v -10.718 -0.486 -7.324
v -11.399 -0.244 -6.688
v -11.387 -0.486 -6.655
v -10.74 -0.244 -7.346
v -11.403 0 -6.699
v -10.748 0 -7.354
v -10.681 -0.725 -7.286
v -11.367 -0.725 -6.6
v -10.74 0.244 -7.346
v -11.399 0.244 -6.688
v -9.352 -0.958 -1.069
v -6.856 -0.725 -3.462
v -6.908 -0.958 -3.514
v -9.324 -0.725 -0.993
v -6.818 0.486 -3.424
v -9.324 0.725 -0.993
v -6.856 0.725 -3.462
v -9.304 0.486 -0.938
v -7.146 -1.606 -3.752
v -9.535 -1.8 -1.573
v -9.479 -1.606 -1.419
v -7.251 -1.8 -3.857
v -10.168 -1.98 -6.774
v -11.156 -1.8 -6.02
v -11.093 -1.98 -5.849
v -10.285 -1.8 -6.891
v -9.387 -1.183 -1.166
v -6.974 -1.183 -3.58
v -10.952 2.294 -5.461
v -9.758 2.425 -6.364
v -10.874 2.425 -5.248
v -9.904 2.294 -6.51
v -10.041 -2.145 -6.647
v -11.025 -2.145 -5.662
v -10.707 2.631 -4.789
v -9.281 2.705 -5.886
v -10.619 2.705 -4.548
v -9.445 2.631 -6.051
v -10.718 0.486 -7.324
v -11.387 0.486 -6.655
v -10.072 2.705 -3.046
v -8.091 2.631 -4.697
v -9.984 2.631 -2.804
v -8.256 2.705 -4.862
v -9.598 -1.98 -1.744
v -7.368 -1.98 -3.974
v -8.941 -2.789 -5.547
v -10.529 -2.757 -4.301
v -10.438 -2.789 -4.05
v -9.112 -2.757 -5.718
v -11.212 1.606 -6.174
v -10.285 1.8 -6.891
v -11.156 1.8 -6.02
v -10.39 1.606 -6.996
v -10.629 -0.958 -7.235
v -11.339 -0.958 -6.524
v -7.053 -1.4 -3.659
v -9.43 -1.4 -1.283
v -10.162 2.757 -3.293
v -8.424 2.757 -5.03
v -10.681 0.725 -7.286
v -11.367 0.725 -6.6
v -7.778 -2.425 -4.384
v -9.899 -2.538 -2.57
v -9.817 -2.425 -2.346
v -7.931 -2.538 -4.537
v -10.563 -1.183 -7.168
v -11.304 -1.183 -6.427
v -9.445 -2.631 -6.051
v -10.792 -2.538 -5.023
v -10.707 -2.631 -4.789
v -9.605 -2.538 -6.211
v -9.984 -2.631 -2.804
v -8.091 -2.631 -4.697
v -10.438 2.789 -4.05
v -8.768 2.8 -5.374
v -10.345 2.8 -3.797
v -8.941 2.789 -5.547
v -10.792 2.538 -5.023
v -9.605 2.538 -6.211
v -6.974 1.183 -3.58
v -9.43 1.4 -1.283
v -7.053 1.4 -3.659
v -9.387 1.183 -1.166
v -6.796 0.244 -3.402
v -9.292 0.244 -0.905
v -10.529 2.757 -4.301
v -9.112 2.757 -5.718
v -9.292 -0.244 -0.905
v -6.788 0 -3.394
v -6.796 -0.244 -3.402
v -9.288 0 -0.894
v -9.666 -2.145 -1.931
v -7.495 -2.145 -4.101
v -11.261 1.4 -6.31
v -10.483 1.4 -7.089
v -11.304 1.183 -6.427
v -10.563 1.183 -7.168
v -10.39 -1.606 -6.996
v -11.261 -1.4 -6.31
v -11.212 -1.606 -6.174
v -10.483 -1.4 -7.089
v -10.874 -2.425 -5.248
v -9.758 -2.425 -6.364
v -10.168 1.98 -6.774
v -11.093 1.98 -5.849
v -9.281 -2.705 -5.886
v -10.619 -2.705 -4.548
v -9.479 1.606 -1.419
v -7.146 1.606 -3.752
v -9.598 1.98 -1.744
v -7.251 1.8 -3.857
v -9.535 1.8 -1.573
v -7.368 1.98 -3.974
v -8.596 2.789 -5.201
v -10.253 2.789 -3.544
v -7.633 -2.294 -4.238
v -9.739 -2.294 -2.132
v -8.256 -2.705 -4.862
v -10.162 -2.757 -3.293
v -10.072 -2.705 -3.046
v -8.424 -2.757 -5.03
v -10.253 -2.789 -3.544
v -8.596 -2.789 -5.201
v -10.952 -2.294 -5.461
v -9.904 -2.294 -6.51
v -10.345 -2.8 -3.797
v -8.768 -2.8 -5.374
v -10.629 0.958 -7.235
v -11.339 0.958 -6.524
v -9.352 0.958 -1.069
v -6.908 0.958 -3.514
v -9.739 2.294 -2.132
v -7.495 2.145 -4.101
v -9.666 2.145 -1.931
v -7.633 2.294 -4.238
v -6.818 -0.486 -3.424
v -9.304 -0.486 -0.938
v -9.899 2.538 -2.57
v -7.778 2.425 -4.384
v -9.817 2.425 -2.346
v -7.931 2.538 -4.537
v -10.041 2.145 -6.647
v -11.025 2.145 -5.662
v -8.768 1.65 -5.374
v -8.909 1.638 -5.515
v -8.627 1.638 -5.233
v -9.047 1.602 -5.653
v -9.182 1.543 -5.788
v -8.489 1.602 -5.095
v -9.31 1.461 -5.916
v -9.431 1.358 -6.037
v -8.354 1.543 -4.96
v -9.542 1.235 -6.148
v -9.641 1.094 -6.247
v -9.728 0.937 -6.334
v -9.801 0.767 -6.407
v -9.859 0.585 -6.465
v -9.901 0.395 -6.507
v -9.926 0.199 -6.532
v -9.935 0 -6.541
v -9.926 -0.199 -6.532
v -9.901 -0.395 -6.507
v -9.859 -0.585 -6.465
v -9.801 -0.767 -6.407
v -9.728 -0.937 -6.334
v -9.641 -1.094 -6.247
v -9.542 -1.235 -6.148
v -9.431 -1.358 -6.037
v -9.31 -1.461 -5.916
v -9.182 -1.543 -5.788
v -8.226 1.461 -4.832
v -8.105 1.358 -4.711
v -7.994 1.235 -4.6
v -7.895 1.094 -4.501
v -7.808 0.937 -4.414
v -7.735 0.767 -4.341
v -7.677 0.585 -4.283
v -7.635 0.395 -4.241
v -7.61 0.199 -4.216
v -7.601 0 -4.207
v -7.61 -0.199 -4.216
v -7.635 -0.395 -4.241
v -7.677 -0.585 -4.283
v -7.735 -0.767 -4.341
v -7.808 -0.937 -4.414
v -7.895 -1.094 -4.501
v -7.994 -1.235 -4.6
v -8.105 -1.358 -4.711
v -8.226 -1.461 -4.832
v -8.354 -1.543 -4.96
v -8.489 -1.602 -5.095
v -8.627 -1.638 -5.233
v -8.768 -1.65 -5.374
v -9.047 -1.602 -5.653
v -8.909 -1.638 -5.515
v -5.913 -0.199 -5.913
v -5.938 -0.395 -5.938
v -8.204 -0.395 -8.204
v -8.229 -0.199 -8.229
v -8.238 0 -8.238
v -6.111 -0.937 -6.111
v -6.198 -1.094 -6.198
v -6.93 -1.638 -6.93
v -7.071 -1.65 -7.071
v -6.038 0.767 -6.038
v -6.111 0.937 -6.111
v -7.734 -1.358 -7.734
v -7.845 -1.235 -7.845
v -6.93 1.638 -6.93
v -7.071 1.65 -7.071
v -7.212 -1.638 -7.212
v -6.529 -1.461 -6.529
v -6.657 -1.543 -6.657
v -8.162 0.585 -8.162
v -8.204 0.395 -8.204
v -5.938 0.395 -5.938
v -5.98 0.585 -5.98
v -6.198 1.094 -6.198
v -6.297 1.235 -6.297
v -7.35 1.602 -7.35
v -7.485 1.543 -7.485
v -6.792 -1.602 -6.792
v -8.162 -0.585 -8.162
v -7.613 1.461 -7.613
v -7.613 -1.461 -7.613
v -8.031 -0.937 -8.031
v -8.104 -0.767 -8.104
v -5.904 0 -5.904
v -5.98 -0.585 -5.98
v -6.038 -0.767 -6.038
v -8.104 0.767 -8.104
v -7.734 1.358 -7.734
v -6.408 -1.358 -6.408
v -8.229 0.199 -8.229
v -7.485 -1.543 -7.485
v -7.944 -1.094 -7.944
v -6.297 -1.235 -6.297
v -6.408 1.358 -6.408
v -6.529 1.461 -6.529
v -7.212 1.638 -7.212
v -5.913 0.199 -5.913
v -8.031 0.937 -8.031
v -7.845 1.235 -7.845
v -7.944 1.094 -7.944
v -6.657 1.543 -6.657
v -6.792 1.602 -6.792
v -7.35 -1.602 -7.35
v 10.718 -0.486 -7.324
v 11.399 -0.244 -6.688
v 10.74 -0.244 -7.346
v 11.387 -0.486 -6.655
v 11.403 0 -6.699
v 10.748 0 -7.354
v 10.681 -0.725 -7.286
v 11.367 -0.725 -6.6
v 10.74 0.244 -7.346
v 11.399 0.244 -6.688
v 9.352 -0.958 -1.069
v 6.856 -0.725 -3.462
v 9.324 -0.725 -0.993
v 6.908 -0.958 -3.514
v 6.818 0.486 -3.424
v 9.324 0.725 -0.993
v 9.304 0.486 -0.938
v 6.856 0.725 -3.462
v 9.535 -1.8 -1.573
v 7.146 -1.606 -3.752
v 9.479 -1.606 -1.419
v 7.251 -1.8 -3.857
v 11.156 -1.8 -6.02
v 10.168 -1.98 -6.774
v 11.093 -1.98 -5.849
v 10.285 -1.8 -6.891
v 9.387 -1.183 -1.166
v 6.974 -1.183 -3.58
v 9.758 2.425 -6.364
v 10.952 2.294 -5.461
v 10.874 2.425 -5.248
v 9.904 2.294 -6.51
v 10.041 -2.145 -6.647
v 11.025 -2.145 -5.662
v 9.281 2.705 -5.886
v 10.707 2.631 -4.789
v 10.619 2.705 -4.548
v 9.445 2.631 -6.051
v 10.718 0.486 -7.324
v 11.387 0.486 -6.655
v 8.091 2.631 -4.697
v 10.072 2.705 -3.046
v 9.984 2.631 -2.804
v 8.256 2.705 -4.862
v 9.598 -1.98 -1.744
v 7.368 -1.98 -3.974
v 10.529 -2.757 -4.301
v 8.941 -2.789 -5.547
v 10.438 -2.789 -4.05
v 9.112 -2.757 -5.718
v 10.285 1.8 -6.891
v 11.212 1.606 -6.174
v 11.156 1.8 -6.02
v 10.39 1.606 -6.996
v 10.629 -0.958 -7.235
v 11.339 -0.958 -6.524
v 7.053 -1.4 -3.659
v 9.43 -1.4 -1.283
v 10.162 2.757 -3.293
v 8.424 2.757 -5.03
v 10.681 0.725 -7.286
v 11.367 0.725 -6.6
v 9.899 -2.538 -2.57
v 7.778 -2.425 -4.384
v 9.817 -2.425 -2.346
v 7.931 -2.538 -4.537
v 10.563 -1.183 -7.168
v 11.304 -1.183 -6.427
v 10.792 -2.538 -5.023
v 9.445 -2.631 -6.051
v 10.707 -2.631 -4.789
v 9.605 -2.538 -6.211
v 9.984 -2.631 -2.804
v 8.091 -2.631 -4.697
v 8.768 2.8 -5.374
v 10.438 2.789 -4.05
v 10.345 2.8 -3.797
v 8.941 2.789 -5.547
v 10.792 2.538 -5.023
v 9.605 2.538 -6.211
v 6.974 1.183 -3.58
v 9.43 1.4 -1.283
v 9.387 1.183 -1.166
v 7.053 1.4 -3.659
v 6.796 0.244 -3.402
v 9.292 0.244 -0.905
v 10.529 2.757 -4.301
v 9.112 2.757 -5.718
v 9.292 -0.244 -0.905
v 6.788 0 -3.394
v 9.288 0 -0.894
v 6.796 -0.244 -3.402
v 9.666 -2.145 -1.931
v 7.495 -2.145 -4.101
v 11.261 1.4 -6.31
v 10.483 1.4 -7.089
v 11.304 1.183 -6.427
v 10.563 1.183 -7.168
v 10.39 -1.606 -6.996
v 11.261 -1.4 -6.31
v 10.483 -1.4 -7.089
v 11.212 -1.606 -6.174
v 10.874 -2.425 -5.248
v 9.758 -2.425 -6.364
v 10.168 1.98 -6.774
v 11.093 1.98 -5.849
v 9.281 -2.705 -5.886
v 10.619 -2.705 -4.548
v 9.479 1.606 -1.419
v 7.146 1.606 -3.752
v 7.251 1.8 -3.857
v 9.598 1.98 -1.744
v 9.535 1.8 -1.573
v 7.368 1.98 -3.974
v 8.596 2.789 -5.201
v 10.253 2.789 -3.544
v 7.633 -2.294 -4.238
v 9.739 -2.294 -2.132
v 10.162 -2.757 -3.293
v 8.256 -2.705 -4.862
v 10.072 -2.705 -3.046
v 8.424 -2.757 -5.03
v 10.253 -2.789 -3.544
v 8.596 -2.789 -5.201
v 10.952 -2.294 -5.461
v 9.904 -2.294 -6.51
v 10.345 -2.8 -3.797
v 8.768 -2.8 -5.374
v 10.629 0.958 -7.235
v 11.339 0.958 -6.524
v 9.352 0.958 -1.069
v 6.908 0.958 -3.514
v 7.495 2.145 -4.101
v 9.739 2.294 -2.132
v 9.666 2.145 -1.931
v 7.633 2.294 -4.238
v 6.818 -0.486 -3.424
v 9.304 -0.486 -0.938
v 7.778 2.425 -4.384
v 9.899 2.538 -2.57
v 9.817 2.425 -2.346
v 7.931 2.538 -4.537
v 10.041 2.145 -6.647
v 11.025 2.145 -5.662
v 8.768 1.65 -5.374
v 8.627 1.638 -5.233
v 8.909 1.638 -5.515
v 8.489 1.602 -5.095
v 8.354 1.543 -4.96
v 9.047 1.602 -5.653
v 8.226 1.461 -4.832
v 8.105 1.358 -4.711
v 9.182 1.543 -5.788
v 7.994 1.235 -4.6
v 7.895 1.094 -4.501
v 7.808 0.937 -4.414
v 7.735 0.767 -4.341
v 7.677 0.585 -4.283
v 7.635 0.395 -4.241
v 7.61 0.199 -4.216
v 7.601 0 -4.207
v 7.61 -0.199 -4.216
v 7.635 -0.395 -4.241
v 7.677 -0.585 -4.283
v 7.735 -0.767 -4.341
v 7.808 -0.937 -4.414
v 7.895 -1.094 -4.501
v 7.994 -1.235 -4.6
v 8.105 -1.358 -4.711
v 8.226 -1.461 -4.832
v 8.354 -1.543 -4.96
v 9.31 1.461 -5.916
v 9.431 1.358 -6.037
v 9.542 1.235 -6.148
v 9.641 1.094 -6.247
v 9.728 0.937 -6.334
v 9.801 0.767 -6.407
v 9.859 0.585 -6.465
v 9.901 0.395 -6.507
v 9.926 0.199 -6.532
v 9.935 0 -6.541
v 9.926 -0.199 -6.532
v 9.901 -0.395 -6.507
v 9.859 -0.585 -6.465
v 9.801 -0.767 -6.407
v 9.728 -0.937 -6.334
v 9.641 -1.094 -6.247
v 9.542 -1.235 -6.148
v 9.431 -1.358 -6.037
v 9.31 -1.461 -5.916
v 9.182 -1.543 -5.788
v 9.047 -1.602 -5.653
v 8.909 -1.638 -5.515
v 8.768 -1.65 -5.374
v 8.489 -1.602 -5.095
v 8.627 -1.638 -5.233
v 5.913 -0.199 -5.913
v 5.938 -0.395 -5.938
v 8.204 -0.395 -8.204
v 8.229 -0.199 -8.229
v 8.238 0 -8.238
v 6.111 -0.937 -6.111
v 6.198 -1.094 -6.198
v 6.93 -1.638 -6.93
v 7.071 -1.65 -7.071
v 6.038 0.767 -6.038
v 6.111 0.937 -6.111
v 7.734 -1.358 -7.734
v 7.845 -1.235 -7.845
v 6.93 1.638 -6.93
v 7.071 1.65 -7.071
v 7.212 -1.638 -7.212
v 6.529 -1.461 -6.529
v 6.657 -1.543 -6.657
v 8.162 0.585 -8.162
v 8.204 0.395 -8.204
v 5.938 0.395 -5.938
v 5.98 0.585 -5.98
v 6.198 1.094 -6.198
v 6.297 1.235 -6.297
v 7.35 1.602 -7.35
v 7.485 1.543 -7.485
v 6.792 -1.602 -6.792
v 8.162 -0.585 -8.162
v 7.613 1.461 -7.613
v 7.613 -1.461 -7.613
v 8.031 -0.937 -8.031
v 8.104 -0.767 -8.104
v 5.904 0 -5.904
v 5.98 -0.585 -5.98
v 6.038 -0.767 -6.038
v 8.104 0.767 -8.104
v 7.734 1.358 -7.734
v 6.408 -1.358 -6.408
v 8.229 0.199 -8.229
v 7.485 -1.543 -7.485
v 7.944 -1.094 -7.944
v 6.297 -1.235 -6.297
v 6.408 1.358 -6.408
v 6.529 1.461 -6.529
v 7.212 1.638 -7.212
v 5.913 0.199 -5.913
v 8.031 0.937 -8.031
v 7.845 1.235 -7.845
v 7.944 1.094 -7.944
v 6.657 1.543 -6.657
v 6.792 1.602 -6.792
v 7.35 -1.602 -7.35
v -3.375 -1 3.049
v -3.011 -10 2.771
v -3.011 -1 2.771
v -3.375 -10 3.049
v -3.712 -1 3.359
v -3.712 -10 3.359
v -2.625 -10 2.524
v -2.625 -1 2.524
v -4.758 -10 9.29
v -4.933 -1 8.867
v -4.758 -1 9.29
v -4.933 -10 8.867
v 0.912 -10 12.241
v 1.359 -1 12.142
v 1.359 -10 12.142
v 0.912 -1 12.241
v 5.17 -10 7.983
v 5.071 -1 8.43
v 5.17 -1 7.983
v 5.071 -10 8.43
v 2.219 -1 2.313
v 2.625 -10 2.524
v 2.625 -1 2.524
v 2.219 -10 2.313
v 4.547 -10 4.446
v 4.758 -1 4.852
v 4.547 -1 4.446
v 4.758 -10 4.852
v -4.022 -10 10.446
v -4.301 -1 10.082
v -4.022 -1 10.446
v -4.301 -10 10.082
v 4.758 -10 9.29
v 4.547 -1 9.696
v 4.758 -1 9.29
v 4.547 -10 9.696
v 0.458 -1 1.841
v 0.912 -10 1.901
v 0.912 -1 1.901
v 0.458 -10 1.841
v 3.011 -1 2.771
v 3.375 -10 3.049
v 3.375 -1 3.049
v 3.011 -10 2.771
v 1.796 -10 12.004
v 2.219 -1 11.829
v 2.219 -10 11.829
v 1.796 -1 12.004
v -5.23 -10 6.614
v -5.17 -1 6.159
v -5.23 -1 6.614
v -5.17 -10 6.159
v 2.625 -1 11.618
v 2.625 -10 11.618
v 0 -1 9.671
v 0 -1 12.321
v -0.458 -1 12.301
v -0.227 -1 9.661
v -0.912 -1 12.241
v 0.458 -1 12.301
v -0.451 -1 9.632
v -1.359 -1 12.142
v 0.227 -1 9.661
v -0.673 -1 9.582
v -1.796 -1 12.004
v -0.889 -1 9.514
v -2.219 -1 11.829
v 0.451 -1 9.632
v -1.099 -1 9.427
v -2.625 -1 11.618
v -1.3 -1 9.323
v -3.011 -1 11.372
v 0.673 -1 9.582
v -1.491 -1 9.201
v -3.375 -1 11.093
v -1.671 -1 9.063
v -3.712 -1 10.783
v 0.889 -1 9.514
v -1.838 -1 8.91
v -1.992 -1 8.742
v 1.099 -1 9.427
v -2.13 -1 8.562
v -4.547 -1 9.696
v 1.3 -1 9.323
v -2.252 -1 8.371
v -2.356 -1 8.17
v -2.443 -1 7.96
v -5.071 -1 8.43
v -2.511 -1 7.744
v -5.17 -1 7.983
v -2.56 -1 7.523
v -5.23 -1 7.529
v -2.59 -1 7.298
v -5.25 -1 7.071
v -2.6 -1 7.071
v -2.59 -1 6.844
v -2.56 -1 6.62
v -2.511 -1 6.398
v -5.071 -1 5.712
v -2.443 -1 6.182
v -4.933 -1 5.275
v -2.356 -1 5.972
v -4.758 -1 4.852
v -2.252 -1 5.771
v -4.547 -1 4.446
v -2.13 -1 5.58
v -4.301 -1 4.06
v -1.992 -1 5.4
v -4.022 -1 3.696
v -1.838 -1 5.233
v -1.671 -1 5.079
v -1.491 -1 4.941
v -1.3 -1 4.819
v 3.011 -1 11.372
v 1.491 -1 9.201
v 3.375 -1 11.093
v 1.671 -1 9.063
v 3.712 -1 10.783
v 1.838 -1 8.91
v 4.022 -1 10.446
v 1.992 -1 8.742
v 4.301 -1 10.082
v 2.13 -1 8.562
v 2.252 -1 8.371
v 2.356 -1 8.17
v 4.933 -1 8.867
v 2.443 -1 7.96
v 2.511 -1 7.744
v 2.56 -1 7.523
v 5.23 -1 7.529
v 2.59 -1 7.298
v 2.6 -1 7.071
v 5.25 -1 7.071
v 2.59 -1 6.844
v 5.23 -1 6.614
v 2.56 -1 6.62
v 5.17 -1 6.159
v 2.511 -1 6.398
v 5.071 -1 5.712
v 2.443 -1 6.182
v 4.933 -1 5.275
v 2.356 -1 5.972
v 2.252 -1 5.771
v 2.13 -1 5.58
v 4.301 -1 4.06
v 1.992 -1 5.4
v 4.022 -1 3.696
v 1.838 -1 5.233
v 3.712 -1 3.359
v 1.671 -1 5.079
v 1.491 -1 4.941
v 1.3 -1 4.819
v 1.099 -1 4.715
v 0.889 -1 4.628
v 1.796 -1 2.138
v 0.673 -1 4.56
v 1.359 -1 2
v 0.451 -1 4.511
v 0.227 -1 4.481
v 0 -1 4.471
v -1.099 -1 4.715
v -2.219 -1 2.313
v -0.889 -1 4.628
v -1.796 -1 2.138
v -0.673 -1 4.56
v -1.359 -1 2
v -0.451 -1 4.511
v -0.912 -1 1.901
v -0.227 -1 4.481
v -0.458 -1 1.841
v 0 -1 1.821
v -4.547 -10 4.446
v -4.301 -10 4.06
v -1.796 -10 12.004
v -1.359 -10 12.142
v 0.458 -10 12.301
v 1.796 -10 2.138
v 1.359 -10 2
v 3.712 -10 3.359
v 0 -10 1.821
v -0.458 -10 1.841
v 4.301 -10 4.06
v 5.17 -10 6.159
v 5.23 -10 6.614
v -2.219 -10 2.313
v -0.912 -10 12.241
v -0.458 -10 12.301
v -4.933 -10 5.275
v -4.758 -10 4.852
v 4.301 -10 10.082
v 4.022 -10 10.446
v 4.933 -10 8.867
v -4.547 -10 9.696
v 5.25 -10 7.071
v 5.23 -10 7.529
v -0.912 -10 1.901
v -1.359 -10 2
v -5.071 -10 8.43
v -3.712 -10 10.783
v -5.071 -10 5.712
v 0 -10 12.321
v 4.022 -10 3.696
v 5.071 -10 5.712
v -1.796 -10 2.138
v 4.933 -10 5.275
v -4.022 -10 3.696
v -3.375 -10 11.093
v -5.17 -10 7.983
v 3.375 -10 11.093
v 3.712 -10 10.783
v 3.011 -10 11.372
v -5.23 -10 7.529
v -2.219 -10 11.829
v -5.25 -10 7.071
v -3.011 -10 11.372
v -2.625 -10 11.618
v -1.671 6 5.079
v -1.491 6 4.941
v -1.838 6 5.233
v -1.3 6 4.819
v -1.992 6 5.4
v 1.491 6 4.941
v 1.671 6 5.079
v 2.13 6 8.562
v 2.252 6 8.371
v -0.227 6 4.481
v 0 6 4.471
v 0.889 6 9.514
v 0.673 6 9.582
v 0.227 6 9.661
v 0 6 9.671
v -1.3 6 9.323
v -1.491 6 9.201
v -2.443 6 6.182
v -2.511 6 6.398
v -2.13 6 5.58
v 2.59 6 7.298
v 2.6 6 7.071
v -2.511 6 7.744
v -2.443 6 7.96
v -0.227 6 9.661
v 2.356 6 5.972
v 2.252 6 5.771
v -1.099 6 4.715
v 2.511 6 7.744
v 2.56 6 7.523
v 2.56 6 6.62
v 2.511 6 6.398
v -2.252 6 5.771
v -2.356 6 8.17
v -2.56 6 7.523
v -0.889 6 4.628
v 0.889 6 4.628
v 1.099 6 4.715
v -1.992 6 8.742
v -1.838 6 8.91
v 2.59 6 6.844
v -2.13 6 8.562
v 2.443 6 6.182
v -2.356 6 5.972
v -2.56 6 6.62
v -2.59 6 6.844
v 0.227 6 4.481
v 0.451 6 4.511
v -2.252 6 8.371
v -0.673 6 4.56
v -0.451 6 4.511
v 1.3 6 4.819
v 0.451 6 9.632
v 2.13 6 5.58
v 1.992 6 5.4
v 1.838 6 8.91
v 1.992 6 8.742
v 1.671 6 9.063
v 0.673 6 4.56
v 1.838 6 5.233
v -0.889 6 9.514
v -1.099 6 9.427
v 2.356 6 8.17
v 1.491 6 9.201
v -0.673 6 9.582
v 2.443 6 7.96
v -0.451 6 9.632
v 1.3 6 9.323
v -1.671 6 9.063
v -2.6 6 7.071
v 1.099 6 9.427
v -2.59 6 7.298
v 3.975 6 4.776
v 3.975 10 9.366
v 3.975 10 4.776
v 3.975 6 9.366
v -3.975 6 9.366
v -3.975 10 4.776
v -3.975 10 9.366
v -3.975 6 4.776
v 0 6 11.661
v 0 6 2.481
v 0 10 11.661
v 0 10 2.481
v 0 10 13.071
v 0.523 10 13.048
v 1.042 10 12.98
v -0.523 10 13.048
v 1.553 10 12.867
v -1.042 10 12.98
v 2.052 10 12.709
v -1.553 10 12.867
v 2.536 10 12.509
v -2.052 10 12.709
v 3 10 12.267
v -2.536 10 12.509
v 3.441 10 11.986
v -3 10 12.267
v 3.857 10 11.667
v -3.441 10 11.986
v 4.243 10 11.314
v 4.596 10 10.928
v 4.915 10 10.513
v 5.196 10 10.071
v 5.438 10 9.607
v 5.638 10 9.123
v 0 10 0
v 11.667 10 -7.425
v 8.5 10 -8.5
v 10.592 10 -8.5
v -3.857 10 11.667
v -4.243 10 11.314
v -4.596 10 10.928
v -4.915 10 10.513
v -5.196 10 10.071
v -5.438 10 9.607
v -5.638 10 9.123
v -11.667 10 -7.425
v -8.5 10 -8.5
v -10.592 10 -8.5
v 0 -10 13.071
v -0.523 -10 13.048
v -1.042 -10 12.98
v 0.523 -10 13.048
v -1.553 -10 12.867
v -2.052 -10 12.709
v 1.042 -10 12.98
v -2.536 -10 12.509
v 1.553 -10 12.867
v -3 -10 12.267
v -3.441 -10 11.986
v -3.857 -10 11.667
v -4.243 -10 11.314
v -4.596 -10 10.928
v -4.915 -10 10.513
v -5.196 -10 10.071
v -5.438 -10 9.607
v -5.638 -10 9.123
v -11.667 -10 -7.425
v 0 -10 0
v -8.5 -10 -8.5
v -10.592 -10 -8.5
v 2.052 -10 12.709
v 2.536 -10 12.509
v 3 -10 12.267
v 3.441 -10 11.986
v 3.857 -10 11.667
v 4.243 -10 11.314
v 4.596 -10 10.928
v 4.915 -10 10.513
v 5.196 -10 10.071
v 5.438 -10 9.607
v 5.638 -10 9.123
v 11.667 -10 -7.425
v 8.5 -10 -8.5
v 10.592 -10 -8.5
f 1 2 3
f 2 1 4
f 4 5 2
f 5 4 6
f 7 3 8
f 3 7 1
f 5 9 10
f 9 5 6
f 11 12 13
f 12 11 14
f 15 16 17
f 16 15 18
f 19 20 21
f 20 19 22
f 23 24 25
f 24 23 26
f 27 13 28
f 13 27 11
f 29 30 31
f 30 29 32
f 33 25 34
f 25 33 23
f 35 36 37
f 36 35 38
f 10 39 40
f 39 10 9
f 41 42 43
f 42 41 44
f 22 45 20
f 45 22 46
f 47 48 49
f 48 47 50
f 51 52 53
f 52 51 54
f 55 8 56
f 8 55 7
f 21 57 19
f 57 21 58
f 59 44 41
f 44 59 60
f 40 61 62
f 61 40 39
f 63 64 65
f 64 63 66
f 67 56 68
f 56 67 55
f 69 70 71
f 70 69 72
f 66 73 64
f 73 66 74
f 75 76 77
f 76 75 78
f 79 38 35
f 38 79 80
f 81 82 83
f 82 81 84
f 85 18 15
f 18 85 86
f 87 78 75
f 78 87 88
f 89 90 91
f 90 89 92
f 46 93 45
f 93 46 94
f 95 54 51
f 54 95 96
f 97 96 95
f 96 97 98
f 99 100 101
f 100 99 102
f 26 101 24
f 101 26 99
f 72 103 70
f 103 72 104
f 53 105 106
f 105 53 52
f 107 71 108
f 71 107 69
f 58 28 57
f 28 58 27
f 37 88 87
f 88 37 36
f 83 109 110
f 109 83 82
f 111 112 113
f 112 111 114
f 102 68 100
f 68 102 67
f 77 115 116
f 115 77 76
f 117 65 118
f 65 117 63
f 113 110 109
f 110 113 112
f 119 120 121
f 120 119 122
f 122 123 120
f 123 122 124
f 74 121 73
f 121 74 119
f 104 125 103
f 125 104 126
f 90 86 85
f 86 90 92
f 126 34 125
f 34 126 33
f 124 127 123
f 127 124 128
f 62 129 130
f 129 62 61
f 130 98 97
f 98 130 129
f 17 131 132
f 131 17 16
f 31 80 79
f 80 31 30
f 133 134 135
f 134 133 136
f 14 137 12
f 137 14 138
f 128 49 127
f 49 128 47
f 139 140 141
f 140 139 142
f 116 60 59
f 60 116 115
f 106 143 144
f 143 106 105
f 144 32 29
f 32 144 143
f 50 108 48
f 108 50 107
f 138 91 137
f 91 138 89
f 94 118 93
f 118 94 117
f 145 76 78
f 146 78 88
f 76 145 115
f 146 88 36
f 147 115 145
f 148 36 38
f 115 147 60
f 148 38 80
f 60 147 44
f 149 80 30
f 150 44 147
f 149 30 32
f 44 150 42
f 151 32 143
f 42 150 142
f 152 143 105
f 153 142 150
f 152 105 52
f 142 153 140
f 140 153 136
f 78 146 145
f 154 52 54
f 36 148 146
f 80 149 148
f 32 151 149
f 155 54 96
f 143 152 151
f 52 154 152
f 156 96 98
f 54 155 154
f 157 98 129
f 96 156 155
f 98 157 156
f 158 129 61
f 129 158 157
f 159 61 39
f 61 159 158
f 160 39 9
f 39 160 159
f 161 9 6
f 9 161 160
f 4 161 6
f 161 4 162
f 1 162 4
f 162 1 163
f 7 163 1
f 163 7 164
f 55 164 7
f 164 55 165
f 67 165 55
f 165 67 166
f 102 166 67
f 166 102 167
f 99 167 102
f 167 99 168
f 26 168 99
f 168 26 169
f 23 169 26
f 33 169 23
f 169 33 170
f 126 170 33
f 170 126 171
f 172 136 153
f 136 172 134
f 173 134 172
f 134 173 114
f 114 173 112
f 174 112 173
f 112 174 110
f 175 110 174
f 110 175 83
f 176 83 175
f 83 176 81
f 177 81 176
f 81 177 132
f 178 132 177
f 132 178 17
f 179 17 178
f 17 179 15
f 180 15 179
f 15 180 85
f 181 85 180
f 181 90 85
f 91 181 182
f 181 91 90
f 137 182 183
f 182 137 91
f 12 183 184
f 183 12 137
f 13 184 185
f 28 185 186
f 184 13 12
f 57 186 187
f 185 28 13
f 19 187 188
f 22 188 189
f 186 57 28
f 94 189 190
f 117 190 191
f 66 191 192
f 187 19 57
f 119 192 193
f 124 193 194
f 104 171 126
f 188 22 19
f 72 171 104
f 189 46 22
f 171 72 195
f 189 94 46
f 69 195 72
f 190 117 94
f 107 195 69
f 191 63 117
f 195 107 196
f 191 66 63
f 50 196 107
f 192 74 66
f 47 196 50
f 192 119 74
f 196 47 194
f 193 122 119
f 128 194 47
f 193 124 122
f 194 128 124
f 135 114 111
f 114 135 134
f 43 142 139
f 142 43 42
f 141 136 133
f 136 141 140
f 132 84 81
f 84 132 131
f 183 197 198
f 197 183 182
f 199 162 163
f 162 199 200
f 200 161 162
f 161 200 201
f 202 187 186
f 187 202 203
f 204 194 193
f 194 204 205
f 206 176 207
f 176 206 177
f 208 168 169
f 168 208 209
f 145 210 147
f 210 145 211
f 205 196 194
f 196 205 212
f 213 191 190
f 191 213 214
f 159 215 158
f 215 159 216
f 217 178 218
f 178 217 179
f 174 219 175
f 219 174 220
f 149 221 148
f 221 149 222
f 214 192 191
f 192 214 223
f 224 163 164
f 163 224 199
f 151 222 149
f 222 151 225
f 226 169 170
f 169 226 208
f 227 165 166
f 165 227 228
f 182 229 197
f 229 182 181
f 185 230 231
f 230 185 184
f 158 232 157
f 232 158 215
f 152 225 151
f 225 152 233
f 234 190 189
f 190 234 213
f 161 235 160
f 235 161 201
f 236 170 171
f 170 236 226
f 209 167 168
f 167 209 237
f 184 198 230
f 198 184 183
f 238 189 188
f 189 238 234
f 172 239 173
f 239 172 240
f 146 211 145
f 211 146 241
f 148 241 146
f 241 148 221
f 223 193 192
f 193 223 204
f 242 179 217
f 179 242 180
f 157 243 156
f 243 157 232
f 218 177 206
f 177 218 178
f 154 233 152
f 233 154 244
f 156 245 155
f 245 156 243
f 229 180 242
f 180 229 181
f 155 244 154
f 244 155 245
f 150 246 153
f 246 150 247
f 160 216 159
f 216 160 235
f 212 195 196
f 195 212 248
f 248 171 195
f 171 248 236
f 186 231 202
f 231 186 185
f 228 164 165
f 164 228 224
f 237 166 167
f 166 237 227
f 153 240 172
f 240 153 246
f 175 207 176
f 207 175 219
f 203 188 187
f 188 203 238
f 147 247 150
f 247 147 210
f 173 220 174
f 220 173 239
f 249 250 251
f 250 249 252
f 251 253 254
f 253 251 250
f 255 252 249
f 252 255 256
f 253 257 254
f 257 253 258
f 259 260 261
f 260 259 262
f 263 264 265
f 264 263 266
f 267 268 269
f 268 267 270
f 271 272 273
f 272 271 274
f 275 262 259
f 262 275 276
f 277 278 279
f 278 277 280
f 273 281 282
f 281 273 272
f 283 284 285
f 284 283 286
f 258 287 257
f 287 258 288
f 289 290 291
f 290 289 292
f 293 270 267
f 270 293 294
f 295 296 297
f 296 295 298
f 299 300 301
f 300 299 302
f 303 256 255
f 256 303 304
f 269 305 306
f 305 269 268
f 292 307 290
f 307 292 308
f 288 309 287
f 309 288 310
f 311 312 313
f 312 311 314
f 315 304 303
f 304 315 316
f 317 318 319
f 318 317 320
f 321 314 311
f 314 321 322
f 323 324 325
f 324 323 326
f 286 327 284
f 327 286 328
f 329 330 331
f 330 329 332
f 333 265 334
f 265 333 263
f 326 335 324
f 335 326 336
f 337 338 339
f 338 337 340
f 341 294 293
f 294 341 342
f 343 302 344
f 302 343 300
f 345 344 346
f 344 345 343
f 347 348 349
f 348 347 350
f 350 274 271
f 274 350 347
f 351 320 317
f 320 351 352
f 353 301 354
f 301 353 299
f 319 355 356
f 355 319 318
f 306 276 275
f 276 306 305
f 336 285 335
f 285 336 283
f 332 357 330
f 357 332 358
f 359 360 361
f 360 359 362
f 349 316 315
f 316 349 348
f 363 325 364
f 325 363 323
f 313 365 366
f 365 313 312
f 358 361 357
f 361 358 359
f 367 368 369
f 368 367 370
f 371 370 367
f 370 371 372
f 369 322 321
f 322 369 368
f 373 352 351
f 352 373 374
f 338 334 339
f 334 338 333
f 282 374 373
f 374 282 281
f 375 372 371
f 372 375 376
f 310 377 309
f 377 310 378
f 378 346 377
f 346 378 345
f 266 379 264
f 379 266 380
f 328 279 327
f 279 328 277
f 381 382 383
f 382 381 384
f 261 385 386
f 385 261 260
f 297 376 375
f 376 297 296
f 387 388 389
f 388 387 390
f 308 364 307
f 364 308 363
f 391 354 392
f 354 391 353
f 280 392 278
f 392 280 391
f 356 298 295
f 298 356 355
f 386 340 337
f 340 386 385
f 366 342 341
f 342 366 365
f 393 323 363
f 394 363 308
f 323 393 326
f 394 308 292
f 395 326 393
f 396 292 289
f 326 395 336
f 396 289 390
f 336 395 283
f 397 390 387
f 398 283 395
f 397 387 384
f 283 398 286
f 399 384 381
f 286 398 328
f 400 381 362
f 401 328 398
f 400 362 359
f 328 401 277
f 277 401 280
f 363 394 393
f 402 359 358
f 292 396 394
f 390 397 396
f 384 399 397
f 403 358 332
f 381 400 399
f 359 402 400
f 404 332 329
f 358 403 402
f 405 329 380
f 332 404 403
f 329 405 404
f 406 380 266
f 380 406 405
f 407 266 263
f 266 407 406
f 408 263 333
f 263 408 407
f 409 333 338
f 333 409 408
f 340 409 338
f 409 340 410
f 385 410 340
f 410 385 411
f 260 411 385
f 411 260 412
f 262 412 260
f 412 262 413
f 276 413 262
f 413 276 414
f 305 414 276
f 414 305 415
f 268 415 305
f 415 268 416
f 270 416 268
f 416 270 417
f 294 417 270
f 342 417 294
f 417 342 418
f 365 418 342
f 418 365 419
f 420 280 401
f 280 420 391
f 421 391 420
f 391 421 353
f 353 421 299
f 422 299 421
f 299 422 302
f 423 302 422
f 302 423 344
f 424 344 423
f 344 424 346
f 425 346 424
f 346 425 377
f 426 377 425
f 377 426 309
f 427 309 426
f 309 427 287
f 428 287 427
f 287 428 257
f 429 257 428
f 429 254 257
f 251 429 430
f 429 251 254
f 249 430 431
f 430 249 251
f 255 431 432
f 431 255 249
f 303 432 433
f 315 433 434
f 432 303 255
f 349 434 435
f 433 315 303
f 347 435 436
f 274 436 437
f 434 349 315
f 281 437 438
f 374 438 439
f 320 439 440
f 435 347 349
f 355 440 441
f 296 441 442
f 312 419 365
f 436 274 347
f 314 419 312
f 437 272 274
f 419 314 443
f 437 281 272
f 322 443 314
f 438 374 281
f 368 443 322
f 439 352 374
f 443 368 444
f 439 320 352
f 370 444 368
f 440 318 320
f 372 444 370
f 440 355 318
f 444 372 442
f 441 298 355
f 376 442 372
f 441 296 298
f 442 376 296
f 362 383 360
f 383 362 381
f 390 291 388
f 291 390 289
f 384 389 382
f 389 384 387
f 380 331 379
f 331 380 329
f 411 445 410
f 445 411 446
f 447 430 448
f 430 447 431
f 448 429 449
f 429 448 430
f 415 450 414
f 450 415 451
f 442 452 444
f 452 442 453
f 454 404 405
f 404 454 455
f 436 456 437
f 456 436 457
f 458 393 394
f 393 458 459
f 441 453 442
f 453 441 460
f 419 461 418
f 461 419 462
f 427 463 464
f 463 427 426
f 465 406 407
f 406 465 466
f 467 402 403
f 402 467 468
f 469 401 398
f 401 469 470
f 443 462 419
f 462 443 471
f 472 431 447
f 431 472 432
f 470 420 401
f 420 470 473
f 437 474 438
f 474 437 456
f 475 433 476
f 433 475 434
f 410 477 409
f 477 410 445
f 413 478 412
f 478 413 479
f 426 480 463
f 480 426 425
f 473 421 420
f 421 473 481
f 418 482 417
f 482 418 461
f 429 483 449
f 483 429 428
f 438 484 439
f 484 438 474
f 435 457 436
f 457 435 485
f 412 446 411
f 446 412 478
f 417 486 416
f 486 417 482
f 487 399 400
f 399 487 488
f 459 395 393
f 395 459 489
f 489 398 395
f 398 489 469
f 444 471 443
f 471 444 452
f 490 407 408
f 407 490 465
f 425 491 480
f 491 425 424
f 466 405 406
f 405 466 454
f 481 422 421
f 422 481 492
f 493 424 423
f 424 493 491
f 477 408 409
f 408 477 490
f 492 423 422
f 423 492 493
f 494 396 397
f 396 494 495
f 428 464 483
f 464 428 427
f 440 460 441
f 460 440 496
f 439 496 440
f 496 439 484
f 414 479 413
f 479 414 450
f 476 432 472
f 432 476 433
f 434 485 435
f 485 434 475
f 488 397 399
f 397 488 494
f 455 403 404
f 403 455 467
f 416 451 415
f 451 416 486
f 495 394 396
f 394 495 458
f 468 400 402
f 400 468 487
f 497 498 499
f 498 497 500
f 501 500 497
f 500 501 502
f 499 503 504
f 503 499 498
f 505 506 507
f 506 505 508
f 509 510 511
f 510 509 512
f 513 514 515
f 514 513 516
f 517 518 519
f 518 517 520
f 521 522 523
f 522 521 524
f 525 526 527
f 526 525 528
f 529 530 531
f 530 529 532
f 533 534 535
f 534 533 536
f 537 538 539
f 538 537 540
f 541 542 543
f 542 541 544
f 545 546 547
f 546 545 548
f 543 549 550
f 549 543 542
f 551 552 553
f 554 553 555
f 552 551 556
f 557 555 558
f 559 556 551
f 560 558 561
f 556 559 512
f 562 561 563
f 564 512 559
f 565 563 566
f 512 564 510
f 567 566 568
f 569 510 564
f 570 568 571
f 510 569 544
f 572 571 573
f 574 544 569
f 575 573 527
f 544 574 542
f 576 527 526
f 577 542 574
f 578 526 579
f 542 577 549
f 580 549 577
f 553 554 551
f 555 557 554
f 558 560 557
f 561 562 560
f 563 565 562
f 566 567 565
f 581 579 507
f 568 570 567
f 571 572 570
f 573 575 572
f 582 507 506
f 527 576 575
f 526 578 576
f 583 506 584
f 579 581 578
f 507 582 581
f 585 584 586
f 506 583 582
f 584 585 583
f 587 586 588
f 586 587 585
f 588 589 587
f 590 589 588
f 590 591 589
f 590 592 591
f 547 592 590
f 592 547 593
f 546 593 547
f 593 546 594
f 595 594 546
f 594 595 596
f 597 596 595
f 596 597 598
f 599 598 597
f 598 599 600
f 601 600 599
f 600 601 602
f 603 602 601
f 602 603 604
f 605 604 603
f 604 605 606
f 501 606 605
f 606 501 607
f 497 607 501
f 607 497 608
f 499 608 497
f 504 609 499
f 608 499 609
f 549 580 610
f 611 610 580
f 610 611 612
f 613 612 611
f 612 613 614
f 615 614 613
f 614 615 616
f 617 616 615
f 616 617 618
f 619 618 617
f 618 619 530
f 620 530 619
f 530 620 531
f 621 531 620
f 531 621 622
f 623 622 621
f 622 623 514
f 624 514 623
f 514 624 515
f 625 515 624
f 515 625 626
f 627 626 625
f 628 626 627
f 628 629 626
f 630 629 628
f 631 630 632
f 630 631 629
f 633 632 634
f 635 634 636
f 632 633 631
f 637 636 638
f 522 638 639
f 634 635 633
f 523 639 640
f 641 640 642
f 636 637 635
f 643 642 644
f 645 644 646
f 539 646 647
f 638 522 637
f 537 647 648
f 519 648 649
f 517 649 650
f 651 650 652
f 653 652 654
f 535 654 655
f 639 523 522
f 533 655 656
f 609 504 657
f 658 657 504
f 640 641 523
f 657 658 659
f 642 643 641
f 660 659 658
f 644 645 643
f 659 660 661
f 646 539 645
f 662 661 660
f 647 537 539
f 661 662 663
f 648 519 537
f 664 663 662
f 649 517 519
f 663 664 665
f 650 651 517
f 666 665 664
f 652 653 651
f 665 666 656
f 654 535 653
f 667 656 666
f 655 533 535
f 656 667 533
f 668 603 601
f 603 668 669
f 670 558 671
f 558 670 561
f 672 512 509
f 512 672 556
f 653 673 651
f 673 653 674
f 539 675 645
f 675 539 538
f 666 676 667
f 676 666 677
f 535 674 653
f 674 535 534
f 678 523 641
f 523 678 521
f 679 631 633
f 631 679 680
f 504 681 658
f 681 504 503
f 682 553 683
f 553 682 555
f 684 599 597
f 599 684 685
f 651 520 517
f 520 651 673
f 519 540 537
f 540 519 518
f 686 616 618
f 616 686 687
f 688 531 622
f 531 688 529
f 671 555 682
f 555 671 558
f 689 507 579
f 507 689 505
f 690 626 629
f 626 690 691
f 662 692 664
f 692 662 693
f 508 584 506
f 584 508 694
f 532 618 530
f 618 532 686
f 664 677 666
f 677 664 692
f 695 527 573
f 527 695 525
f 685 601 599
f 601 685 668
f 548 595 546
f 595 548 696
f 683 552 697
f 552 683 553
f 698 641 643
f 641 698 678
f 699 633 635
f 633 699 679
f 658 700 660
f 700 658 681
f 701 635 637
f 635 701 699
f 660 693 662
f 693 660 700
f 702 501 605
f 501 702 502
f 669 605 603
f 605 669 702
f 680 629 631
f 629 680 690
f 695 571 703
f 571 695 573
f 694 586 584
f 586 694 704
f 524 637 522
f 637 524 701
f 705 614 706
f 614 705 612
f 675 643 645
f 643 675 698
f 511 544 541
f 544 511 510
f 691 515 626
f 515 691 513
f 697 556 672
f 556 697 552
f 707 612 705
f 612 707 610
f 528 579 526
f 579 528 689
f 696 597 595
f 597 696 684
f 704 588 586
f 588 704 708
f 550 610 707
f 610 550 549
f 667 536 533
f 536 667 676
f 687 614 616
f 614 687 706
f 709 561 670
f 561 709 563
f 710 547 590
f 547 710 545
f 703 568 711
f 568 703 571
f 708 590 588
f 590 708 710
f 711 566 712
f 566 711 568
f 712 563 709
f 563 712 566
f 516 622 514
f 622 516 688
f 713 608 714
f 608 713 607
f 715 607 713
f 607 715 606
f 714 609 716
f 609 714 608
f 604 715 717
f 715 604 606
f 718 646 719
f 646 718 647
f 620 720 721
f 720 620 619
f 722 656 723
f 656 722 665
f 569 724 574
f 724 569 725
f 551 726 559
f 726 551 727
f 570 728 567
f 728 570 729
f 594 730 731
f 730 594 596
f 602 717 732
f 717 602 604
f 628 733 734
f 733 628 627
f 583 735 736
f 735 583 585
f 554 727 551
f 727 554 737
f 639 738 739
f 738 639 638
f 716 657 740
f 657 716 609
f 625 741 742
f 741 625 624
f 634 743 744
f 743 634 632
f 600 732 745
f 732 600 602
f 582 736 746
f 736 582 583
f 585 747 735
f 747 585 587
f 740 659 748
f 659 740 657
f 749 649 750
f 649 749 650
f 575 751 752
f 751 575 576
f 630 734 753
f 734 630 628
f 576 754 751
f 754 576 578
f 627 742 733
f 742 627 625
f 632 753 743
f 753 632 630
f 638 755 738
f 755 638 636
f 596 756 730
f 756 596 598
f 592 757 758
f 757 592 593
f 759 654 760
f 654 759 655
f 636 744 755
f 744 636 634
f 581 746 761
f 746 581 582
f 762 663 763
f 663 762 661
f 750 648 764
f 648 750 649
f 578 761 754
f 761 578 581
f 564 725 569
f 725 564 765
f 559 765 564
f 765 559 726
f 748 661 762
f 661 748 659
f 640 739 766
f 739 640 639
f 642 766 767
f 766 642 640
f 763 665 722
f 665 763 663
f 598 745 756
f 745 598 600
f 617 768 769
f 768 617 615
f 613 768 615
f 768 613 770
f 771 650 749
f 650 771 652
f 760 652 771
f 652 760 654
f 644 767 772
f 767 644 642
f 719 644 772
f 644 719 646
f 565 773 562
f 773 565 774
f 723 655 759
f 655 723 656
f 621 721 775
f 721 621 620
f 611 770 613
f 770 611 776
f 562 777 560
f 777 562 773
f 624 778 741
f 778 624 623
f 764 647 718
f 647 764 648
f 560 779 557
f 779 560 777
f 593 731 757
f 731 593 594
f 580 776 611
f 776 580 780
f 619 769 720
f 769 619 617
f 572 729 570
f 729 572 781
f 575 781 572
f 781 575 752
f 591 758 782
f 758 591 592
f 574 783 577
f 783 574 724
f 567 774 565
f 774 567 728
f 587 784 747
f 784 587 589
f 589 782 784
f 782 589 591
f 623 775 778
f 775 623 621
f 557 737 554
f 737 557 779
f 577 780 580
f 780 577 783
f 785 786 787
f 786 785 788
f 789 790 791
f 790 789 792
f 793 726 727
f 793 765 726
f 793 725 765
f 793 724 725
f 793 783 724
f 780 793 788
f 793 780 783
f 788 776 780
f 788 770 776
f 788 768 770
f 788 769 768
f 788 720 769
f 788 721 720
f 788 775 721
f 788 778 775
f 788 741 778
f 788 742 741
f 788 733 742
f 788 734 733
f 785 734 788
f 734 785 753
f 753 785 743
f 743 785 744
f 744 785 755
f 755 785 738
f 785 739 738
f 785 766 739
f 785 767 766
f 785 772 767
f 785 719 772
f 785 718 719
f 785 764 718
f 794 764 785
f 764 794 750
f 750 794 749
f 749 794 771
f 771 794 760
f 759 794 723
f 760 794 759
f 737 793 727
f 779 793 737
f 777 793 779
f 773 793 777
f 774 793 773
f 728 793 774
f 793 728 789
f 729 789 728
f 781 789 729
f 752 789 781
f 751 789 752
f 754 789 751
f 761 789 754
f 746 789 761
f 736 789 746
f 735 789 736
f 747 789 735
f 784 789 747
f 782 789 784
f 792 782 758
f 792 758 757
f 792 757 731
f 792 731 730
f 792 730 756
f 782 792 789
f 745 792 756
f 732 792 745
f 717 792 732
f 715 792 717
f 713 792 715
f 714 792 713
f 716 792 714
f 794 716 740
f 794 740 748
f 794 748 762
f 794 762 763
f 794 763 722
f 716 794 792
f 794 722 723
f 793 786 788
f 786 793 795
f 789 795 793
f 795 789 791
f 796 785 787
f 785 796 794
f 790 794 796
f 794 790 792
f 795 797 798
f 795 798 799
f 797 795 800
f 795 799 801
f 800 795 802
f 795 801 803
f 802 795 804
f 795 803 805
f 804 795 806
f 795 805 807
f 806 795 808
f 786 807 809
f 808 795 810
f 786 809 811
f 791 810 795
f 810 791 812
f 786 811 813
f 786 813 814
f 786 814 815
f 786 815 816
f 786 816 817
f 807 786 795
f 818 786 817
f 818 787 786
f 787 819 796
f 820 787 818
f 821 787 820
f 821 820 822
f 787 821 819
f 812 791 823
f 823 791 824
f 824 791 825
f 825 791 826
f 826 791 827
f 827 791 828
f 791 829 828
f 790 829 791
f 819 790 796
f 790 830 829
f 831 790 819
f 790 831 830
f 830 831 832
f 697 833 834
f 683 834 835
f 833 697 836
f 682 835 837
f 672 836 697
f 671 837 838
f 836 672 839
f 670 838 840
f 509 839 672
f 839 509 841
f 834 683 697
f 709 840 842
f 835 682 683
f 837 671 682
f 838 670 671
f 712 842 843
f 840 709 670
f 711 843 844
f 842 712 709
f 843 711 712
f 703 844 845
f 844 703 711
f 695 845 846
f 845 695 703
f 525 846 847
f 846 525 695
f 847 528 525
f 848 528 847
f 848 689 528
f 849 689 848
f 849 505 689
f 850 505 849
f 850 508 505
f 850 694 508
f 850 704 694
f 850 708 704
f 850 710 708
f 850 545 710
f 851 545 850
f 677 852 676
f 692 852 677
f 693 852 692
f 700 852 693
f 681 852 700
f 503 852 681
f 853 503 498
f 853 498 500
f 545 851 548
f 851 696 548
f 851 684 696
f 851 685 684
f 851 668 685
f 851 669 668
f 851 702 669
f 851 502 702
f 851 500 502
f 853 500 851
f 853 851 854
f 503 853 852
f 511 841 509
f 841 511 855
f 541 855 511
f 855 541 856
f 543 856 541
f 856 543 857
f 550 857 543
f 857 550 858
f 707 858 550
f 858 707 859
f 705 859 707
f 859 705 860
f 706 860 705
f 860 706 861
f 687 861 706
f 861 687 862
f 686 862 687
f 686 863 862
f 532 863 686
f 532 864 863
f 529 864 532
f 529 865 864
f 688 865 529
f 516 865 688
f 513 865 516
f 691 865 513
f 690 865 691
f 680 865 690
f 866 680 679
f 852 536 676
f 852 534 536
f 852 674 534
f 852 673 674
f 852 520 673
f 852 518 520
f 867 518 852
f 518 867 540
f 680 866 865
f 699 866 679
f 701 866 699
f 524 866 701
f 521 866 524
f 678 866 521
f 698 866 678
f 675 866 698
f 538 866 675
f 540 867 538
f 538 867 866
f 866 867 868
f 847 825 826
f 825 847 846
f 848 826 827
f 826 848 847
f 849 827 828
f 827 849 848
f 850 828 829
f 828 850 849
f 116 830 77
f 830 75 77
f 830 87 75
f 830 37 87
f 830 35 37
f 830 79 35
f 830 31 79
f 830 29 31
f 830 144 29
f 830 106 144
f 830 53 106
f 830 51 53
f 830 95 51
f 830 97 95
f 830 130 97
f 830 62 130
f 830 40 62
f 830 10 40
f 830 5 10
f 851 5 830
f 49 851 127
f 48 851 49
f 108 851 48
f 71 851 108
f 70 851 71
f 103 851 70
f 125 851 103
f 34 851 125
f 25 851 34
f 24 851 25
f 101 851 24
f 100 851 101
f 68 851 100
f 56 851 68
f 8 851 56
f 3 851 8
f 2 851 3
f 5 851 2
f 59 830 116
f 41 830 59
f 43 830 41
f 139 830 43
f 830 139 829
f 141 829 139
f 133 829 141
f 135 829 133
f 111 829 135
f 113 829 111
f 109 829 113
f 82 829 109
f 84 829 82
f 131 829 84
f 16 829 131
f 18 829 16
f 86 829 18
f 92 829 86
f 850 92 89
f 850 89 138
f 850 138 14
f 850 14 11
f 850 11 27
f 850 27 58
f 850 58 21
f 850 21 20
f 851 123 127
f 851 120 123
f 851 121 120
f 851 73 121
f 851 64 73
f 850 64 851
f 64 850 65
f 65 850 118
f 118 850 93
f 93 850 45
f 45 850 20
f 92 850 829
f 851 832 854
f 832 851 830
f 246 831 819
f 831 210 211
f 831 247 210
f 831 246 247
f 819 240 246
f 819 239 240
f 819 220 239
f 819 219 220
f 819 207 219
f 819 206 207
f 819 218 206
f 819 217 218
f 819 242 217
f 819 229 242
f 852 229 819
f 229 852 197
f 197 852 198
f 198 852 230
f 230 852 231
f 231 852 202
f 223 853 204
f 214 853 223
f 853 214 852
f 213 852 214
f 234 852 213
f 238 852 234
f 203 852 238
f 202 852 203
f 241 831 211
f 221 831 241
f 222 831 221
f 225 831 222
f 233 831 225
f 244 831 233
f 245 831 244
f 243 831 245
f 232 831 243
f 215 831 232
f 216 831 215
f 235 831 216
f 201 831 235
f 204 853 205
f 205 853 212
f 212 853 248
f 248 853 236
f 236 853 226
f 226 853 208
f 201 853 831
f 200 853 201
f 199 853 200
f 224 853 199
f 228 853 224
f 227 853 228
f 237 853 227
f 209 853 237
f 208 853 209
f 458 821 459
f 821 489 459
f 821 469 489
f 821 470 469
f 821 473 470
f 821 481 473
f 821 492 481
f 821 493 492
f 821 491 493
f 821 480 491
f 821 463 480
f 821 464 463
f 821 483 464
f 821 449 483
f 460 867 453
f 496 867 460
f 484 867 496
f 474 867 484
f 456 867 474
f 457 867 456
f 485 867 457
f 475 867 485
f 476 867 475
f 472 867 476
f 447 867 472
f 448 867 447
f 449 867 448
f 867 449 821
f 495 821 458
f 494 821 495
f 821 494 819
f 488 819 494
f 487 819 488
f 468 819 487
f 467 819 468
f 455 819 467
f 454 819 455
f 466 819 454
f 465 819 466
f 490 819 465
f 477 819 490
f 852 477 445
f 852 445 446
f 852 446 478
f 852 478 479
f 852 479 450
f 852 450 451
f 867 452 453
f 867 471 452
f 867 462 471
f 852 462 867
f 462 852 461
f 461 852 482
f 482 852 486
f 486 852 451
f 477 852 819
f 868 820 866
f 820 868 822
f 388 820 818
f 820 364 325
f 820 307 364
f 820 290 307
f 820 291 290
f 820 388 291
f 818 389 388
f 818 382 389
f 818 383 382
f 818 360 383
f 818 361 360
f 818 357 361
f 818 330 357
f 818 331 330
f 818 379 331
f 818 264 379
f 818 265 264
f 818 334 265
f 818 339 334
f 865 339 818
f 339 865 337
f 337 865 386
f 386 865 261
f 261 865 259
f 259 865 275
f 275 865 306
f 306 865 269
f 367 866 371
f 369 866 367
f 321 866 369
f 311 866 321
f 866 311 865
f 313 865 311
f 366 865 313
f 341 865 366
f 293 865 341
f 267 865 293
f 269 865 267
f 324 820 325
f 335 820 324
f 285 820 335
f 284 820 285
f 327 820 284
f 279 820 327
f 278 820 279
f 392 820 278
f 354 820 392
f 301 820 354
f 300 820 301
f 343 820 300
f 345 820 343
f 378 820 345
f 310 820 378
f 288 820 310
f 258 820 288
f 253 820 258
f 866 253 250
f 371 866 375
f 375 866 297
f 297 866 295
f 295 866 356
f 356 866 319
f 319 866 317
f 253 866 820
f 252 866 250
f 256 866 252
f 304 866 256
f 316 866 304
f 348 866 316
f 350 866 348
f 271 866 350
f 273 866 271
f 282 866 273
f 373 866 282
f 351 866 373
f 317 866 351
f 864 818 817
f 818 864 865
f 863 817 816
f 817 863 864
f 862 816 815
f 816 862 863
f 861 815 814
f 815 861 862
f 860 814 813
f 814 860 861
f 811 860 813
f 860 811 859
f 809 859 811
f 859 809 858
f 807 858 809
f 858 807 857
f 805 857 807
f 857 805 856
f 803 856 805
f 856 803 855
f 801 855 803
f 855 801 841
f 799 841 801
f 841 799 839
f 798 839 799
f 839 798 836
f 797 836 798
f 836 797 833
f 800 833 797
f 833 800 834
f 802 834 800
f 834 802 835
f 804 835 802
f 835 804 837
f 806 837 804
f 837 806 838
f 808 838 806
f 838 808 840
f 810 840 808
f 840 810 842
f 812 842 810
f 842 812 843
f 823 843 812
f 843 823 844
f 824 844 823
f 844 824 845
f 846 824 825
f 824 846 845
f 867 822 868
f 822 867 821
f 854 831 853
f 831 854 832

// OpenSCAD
module pusher_base(h=15)
difference() {

linear_extrude(height=h,convexity=3) {

polygon([
	[5,0],[-7,0],[-7,2.1],[-5,2.1],
	[-5,4],[-7,6],[-10,6],
	[-10,-3],[-3,-4],[5,-10]
]);
translate([5,-5])
circle(d=10);
}
	translate([5,-5,10]) {
		cylinder(d=5.4,h=100);
		cylinder(d=1.5,h=100,center=true);
	}

}

module pusher_a() difference() {
	pusher_base(h=20);
	for (z=[0,8,16])
	translate([0,-10,z-0.1])
	cube([20,20,4+0.2]);
}

module pusher_b() mirror([1,1,0]) difference() {
	pusher_base(h=20);
	for (z=[4,12])
	translate([0,-10,z-0.1])
	cube([20,20,4+0.2]);
}

*%pusher_a();
*color("red")
pusher_b();

*union() {
//rotate(180)
translate([20,10,0])
rotate([0,-90,0])
pusher_a();

rotate([-90,0,-90])
pusher_b();
}

module pusher_c() difference() {
linear_extrude(height=20,center=true,convexity=3) {
difference() {
	hull() {
		translate([-3,-3]) square(20-3.5);
		translate([-5,-5]) circle(d=12);
	}
	square(24);
}
//translate([0,10-3]) square([0.6,6]);
//translate([10-3,0]) square([6,0.6]);
}
*rotate(45) translate([9.8,0,0]) cube([9.8,9.8,100],center=true);
rotate(45) translate([100/2+8.5,0,0]) cube(100,center=true);
for (i=[0,1]) mirror([i,-i,0])
translate([10,-2.4,0]) rotate([90,0,0]) {
	//cylinder(d=10.5,h=100);
	//cylinder(d=4.2,h=100,center=true);
	cylinder(d=5.6,h=100);
	cylinder(d=3.3,h=100,center=true);
}
translate([-5,-5,-10]) {
translate([0,0,4+7]) cylinder(d=10.5,h=100);
cylinder(d=5.2,h=100,center=true);
linear_extrude(height=8,center=true,convexity=3)
rotate(-15)
ngon(6,7.95);
}
}

rotate([90,0,0])
rotate(180+45)
pusher_c();


module ngon(n,w) polygon([
	for (i=[1:n]) w/sqrt(3) * [cos(360*i/n), sin(360*i/n)]
	]);

$fs=.2;
$fa=5;
